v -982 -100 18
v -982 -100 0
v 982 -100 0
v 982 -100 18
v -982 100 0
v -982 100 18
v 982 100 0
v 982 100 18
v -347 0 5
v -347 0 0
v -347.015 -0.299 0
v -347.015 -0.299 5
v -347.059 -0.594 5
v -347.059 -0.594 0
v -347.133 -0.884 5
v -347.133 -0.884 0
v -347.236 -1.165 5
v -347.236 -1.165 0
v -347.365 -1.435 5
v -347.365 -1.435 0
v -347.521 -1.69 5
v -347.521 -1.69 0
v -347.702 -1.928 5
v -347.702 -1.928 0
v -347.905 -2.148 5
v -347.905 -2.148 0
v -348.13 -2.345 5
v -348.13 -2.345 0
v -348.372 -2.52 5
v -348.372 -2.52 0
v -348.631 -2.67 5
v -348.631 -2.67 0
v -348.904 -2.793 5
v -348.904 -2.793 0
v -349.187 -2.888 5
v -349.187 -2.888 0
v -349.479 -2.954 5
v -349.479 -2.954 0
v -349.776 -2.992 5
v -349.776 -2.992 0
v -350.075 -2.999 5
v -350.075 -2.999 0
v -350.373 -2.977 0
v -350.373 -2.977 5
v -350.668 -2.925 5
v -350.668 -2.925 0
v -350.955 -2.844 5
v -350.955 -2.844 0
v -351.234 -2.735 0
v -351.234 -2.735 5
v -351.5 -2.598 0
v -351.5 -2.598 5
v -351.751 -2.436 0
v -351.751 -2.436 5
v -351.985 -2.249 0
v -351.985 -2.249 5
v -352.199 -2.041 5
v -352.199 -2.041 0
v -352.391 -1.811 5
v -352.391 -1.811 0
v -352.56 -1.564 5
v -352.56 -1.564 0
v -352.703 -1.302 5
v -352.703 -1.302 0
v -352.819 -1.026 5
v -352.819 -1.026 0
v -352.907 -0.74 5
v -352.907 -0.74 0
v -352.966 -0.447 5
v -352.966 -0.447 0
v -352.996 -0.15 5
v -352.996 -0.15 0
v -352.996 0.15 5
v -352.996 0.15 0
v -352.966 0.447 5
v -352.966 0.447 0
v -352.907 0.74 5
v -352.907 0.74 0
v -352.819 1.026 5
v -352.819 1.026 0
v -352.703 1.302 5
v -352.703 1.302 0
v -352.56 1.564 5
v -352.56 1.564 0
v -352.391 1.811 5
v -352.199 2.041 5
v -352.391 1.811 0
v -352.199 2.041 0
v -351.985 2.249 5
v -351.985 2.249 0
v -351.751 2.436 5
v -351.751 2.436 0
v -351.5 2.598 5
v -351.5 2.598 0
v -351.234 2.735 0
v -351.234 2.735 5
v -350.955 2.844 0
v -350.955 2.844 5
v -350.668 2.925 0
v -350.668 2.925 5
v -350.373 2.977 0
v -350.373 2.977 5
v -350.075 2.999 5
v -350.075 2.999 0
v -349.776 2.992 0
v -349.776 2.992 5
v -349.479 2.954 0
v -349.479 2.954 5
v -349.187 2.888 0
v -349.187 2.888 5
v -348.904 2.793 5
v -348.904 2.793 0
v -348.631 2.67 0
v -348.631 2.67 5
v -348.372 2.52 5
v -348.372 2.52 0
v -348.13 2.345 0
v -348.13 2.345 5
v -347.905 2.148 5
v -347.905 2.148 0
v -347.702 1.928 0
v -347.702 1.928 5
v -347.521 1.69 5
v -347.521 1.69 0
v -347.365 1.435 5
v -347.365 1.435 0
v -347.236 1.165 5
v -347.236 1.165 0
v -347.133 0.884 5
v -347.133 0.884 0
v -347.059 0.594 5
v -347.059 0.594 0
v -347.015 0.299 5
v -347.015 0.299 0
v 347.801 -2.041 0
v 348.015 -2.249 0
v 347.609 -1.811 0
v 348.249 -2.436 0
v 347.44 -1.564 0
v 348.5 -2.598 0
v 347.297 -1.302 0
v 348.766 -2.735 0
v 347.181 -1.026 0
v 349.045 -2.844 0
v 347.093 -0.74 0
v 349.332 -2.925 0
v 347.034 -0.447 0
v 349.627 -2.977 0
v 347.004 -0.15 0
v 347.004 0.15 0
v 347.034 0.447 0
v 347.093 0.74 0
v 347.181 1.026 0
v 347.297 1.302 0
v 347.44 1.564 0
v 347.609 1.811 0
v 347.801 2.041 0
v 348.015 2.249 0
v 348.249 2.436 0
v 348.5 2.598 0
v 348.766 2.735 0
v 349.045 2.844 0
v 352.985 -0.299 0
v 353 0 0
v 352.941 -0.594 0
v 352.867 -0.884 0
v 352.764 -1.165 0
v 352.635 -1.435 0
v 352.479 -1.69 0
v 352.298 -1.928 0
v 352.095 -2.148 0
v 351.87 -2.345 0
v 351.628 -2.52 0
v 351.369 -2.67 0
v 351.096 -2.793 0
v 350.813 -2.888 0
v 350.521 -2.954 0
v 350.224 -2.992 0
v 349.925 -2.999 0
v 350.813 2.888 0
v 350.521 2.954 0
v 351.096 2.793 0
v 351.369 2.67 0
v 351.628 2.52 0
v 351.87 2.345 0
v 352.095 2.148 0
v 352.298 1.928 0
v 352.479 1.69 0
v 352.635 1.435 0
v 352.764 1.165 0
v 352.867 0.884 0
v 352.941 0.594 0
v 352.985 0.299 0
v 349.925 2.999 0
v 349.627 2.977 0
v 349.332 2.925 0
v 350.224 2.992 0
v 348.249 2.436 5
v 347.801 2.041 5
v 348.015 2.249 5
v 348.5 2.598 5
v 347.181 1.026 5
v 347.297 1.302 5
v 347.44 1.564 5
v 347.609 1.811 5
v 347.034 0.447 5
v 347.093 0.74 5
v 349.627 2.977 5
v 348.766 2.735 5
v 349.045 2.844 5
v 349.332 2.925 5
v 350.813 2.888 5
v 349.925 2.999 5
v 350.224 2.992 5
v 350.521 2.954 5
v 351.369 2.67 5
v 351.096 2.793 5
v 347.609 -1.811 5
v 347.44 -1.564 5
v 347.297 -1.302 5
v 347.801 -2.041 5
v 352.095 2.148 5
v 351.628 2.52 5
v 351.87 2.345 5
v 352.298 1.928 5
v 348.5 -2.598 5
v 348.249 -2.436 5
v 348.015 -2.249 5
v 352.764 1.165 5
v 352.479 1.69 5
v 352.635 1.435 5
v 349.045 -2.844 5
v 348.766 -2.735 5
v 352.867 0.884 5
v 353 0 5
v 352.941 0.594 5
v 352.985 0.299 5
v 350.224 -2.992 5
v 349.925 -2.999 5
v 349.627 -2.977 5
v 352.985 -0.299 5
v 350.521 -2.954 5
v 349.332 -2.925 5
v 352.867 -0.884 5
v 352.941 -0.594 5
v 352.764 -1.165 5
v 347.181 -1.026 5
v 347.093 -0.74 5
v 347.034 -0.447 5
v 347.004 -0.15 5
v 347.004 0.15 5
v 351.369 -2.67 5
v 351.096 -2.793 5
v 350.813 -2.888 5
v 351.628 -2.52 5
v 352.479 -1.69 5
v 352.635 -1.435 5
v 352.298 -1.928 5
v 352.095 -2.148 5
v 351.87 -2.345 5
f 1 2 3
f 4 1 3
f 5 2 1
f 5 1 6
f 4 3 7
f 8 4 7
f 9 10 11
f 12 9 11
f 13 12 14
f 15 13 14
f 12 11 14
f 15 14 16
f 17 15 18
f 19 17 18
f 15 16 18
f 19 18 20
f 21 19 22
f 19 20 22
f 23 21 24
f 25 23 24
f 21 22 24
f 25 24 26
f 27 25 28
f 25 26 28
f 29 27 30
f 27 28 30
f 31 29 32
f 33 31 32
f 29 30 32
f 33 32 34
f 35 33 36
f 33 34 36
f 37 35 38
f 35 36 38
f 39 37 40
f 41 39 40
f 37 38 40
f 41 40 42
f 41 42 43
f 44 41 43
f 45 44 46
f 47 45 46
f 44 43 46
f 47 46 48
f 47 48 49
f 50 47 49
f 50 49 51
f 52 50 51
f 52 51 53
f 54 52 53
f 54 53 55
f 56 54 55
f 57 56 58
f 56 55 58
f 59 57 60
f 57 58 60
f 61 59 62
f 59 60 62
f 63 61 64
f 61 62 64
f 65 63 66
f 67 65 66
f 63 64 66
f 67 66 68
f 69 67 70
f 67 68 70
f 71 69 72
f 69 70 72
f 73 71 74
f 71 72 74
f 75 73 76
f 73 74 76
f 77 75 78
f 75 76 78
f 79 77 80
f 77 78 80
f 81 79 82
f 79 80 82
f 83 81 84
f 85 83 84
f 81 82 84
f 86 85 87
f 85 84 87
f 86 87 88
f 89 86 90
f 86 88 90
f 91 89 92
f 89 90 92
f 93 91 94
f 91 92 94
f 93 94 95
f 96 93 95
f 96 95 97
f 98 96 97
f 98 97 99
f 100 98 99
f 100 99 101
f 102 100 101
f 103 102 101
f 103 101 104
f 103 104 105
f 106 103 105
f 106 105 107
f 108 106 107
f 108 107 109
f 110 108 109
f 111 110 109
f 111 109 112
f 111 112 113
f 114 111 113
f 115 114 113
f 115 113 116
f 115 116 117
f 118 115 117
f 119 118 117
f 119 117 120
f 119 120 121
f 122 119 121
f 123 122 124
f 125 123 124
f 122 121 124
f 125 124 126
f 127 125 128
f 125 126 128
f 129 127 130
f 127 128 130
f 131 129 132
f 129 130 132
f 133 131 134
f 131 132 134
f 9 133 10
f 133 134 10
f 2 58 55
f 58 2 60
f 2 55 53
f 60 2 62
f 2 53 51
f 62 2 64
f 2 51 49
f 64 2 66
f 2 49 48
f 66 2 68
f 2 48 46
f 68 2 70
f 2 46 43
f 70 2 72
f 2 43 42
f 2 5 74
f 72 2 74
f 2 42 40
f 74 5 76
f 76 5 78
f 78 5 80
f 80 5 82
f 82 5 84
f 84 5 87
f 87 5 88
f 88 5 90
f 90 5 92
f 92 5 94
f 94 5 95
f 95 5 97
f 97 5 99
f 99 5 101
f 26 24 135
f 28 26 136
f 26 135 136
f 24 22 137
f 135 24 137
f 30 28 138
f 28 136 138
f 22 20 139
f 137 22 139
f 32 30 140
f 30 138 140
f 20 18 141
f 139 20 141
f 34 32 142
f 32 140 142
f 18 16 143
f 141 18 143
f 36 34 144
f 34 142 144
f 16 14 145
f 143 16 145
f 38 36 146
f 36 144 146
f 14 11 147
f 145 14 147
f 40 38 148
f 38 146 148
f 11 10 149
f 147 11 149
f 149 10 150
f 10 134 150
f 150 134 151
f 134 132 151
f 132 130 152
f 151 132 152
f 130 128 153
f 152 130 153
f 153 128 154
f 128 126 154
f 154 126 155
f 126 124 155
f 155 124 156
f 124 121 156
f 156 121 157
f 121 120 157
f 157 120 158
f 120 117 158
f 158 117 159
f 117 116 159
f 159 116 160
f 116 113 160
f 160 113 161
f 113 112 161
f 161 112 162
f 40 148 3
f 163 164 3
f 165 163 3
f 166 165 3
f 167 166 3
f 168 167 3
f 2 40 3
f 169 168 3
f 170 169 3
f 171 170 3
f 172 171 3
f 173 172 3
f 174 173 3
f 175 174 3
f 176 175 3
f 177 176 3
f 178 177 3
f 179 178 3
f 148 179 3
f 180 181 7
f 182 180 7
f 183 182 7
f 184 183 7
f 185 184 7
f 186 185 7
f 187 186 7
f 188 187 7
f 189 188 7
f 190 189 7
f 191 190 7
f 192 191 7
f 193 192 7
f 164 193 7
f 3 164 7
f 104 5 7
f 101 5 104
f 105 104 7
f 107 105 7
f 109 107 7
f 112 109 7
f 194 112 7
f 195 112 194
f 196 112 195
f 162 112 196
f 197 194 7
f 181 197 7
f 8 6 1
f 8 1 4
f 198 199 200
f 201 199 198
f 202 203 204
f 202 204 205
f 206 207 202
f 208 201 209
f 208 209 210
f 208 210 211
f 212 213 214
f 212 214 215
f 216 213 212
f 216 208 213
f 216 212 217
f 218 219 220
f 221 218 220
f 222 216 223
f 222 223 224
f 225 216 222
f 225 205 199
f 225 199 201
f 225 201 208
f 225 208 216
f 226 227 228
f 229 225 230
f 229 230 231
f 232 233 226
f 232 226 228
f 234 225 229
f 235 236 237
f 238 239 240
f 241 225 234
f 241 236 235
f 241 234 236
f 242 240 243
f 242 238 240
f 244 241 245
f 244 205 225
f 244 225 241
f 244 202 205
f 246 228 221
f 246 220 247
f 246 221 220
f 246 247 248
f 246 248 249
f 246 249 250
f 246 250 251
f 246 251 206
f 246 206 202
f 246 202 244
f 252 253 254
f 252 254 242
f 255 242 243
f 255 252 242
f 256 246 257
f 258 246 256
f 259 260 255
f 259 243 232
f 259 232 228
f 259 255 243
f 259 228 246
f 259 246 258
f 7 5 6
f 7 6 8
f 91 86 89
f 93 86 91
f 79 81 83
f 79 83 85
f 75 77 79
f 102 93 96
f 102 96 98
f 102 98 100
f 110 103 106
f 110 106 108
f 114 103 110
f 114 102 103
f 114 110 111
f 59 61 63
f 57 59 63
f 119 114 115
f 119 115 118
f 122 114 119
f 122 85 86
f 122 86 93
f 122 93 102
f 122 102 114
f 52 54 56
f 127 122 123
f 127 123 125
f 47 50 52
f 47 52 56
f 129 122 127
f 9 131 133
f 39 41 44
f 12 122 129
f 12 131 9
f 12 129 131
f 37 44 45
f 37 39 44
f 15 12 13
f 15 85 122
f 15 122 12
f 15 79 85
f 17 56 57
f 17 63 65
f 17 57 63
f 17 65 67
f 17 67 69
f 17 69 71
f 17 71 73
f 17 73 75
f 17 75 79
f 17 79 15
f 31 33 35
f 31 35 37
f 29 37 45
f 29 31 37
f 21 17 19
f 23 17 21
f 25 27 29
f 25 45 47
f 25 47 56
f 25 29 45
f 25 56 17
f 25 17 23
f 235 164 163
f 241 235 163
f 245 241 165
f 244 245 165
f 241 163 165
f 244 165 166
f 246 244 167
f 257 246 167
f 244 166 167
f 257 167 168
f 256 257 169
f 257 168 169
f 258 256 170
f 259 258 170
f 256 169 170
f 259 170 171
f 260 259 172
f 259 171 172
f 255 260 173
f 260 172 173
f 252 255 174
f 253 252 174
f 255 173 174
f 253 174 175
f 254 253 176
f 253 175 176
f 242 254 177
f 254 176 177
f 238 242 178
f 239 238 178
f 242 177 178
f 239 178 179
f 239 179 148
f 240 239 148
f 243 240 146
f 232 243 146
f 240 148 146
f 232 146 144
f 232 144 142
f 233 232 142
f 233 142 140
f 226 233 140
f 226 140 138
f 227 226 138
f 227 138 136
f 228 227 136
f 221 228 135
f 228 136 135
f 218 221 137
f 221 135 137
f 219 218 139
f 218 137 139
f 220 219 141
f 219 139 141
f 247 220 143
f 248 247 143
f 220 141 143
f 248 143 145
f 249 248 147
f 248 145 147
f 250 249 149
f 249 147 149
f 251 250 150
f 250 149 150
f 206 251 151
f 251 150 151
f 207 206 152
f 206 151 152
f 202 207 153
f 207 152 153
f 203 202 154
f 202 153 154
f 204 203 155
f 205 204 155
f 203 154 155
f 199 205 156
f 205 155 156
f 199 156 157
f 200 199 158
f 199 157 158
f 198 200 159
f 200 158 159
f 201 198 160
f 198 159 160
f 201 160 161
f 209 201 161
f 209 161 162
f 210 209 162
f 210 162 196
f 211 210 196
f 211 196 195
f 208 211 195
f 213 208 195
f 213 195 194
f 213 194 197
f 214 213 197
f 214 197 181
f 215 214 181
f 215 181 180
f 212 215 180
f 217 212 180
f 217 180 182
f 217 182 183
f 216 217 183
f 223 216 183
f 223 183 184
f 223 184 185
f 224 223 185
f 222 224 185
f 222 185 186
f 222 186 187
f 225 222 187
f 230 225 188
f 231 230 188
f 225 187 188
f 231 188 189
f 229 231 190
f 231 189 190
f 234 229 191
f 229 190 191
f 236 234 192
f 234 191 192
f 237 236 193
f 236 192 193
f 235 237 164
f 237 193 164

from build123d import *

# Parameters (mm, degrees)
F0_W     = 1964
F0_H     = 200
F1_DEPTH = 18
F2_R     = 3
F3_DEPTH = 5


with BuildPart() as f1:
    # F0 (on Top) → F1 (new body)
    with BuildSketch(Plane.XY):
        Rectangle(F0_W, F0_H)
    extrude(amount=F1_DEPTH)

    # F2 (on face) → F3 (cut)
    with BuildSketch(Plane(origin=(0, 0, 0), x_dir=(1, 0, 0), z_dir=(0, 0, -1))):
        with Locations((-350, 0)):
            Circle(F2_R)
        with Locations((350, 0)):
            Circle(F2_R)
    extrude(amount=-F3_DEPTH, mode=Mode.SUBTRACT)


solid = f1.part
